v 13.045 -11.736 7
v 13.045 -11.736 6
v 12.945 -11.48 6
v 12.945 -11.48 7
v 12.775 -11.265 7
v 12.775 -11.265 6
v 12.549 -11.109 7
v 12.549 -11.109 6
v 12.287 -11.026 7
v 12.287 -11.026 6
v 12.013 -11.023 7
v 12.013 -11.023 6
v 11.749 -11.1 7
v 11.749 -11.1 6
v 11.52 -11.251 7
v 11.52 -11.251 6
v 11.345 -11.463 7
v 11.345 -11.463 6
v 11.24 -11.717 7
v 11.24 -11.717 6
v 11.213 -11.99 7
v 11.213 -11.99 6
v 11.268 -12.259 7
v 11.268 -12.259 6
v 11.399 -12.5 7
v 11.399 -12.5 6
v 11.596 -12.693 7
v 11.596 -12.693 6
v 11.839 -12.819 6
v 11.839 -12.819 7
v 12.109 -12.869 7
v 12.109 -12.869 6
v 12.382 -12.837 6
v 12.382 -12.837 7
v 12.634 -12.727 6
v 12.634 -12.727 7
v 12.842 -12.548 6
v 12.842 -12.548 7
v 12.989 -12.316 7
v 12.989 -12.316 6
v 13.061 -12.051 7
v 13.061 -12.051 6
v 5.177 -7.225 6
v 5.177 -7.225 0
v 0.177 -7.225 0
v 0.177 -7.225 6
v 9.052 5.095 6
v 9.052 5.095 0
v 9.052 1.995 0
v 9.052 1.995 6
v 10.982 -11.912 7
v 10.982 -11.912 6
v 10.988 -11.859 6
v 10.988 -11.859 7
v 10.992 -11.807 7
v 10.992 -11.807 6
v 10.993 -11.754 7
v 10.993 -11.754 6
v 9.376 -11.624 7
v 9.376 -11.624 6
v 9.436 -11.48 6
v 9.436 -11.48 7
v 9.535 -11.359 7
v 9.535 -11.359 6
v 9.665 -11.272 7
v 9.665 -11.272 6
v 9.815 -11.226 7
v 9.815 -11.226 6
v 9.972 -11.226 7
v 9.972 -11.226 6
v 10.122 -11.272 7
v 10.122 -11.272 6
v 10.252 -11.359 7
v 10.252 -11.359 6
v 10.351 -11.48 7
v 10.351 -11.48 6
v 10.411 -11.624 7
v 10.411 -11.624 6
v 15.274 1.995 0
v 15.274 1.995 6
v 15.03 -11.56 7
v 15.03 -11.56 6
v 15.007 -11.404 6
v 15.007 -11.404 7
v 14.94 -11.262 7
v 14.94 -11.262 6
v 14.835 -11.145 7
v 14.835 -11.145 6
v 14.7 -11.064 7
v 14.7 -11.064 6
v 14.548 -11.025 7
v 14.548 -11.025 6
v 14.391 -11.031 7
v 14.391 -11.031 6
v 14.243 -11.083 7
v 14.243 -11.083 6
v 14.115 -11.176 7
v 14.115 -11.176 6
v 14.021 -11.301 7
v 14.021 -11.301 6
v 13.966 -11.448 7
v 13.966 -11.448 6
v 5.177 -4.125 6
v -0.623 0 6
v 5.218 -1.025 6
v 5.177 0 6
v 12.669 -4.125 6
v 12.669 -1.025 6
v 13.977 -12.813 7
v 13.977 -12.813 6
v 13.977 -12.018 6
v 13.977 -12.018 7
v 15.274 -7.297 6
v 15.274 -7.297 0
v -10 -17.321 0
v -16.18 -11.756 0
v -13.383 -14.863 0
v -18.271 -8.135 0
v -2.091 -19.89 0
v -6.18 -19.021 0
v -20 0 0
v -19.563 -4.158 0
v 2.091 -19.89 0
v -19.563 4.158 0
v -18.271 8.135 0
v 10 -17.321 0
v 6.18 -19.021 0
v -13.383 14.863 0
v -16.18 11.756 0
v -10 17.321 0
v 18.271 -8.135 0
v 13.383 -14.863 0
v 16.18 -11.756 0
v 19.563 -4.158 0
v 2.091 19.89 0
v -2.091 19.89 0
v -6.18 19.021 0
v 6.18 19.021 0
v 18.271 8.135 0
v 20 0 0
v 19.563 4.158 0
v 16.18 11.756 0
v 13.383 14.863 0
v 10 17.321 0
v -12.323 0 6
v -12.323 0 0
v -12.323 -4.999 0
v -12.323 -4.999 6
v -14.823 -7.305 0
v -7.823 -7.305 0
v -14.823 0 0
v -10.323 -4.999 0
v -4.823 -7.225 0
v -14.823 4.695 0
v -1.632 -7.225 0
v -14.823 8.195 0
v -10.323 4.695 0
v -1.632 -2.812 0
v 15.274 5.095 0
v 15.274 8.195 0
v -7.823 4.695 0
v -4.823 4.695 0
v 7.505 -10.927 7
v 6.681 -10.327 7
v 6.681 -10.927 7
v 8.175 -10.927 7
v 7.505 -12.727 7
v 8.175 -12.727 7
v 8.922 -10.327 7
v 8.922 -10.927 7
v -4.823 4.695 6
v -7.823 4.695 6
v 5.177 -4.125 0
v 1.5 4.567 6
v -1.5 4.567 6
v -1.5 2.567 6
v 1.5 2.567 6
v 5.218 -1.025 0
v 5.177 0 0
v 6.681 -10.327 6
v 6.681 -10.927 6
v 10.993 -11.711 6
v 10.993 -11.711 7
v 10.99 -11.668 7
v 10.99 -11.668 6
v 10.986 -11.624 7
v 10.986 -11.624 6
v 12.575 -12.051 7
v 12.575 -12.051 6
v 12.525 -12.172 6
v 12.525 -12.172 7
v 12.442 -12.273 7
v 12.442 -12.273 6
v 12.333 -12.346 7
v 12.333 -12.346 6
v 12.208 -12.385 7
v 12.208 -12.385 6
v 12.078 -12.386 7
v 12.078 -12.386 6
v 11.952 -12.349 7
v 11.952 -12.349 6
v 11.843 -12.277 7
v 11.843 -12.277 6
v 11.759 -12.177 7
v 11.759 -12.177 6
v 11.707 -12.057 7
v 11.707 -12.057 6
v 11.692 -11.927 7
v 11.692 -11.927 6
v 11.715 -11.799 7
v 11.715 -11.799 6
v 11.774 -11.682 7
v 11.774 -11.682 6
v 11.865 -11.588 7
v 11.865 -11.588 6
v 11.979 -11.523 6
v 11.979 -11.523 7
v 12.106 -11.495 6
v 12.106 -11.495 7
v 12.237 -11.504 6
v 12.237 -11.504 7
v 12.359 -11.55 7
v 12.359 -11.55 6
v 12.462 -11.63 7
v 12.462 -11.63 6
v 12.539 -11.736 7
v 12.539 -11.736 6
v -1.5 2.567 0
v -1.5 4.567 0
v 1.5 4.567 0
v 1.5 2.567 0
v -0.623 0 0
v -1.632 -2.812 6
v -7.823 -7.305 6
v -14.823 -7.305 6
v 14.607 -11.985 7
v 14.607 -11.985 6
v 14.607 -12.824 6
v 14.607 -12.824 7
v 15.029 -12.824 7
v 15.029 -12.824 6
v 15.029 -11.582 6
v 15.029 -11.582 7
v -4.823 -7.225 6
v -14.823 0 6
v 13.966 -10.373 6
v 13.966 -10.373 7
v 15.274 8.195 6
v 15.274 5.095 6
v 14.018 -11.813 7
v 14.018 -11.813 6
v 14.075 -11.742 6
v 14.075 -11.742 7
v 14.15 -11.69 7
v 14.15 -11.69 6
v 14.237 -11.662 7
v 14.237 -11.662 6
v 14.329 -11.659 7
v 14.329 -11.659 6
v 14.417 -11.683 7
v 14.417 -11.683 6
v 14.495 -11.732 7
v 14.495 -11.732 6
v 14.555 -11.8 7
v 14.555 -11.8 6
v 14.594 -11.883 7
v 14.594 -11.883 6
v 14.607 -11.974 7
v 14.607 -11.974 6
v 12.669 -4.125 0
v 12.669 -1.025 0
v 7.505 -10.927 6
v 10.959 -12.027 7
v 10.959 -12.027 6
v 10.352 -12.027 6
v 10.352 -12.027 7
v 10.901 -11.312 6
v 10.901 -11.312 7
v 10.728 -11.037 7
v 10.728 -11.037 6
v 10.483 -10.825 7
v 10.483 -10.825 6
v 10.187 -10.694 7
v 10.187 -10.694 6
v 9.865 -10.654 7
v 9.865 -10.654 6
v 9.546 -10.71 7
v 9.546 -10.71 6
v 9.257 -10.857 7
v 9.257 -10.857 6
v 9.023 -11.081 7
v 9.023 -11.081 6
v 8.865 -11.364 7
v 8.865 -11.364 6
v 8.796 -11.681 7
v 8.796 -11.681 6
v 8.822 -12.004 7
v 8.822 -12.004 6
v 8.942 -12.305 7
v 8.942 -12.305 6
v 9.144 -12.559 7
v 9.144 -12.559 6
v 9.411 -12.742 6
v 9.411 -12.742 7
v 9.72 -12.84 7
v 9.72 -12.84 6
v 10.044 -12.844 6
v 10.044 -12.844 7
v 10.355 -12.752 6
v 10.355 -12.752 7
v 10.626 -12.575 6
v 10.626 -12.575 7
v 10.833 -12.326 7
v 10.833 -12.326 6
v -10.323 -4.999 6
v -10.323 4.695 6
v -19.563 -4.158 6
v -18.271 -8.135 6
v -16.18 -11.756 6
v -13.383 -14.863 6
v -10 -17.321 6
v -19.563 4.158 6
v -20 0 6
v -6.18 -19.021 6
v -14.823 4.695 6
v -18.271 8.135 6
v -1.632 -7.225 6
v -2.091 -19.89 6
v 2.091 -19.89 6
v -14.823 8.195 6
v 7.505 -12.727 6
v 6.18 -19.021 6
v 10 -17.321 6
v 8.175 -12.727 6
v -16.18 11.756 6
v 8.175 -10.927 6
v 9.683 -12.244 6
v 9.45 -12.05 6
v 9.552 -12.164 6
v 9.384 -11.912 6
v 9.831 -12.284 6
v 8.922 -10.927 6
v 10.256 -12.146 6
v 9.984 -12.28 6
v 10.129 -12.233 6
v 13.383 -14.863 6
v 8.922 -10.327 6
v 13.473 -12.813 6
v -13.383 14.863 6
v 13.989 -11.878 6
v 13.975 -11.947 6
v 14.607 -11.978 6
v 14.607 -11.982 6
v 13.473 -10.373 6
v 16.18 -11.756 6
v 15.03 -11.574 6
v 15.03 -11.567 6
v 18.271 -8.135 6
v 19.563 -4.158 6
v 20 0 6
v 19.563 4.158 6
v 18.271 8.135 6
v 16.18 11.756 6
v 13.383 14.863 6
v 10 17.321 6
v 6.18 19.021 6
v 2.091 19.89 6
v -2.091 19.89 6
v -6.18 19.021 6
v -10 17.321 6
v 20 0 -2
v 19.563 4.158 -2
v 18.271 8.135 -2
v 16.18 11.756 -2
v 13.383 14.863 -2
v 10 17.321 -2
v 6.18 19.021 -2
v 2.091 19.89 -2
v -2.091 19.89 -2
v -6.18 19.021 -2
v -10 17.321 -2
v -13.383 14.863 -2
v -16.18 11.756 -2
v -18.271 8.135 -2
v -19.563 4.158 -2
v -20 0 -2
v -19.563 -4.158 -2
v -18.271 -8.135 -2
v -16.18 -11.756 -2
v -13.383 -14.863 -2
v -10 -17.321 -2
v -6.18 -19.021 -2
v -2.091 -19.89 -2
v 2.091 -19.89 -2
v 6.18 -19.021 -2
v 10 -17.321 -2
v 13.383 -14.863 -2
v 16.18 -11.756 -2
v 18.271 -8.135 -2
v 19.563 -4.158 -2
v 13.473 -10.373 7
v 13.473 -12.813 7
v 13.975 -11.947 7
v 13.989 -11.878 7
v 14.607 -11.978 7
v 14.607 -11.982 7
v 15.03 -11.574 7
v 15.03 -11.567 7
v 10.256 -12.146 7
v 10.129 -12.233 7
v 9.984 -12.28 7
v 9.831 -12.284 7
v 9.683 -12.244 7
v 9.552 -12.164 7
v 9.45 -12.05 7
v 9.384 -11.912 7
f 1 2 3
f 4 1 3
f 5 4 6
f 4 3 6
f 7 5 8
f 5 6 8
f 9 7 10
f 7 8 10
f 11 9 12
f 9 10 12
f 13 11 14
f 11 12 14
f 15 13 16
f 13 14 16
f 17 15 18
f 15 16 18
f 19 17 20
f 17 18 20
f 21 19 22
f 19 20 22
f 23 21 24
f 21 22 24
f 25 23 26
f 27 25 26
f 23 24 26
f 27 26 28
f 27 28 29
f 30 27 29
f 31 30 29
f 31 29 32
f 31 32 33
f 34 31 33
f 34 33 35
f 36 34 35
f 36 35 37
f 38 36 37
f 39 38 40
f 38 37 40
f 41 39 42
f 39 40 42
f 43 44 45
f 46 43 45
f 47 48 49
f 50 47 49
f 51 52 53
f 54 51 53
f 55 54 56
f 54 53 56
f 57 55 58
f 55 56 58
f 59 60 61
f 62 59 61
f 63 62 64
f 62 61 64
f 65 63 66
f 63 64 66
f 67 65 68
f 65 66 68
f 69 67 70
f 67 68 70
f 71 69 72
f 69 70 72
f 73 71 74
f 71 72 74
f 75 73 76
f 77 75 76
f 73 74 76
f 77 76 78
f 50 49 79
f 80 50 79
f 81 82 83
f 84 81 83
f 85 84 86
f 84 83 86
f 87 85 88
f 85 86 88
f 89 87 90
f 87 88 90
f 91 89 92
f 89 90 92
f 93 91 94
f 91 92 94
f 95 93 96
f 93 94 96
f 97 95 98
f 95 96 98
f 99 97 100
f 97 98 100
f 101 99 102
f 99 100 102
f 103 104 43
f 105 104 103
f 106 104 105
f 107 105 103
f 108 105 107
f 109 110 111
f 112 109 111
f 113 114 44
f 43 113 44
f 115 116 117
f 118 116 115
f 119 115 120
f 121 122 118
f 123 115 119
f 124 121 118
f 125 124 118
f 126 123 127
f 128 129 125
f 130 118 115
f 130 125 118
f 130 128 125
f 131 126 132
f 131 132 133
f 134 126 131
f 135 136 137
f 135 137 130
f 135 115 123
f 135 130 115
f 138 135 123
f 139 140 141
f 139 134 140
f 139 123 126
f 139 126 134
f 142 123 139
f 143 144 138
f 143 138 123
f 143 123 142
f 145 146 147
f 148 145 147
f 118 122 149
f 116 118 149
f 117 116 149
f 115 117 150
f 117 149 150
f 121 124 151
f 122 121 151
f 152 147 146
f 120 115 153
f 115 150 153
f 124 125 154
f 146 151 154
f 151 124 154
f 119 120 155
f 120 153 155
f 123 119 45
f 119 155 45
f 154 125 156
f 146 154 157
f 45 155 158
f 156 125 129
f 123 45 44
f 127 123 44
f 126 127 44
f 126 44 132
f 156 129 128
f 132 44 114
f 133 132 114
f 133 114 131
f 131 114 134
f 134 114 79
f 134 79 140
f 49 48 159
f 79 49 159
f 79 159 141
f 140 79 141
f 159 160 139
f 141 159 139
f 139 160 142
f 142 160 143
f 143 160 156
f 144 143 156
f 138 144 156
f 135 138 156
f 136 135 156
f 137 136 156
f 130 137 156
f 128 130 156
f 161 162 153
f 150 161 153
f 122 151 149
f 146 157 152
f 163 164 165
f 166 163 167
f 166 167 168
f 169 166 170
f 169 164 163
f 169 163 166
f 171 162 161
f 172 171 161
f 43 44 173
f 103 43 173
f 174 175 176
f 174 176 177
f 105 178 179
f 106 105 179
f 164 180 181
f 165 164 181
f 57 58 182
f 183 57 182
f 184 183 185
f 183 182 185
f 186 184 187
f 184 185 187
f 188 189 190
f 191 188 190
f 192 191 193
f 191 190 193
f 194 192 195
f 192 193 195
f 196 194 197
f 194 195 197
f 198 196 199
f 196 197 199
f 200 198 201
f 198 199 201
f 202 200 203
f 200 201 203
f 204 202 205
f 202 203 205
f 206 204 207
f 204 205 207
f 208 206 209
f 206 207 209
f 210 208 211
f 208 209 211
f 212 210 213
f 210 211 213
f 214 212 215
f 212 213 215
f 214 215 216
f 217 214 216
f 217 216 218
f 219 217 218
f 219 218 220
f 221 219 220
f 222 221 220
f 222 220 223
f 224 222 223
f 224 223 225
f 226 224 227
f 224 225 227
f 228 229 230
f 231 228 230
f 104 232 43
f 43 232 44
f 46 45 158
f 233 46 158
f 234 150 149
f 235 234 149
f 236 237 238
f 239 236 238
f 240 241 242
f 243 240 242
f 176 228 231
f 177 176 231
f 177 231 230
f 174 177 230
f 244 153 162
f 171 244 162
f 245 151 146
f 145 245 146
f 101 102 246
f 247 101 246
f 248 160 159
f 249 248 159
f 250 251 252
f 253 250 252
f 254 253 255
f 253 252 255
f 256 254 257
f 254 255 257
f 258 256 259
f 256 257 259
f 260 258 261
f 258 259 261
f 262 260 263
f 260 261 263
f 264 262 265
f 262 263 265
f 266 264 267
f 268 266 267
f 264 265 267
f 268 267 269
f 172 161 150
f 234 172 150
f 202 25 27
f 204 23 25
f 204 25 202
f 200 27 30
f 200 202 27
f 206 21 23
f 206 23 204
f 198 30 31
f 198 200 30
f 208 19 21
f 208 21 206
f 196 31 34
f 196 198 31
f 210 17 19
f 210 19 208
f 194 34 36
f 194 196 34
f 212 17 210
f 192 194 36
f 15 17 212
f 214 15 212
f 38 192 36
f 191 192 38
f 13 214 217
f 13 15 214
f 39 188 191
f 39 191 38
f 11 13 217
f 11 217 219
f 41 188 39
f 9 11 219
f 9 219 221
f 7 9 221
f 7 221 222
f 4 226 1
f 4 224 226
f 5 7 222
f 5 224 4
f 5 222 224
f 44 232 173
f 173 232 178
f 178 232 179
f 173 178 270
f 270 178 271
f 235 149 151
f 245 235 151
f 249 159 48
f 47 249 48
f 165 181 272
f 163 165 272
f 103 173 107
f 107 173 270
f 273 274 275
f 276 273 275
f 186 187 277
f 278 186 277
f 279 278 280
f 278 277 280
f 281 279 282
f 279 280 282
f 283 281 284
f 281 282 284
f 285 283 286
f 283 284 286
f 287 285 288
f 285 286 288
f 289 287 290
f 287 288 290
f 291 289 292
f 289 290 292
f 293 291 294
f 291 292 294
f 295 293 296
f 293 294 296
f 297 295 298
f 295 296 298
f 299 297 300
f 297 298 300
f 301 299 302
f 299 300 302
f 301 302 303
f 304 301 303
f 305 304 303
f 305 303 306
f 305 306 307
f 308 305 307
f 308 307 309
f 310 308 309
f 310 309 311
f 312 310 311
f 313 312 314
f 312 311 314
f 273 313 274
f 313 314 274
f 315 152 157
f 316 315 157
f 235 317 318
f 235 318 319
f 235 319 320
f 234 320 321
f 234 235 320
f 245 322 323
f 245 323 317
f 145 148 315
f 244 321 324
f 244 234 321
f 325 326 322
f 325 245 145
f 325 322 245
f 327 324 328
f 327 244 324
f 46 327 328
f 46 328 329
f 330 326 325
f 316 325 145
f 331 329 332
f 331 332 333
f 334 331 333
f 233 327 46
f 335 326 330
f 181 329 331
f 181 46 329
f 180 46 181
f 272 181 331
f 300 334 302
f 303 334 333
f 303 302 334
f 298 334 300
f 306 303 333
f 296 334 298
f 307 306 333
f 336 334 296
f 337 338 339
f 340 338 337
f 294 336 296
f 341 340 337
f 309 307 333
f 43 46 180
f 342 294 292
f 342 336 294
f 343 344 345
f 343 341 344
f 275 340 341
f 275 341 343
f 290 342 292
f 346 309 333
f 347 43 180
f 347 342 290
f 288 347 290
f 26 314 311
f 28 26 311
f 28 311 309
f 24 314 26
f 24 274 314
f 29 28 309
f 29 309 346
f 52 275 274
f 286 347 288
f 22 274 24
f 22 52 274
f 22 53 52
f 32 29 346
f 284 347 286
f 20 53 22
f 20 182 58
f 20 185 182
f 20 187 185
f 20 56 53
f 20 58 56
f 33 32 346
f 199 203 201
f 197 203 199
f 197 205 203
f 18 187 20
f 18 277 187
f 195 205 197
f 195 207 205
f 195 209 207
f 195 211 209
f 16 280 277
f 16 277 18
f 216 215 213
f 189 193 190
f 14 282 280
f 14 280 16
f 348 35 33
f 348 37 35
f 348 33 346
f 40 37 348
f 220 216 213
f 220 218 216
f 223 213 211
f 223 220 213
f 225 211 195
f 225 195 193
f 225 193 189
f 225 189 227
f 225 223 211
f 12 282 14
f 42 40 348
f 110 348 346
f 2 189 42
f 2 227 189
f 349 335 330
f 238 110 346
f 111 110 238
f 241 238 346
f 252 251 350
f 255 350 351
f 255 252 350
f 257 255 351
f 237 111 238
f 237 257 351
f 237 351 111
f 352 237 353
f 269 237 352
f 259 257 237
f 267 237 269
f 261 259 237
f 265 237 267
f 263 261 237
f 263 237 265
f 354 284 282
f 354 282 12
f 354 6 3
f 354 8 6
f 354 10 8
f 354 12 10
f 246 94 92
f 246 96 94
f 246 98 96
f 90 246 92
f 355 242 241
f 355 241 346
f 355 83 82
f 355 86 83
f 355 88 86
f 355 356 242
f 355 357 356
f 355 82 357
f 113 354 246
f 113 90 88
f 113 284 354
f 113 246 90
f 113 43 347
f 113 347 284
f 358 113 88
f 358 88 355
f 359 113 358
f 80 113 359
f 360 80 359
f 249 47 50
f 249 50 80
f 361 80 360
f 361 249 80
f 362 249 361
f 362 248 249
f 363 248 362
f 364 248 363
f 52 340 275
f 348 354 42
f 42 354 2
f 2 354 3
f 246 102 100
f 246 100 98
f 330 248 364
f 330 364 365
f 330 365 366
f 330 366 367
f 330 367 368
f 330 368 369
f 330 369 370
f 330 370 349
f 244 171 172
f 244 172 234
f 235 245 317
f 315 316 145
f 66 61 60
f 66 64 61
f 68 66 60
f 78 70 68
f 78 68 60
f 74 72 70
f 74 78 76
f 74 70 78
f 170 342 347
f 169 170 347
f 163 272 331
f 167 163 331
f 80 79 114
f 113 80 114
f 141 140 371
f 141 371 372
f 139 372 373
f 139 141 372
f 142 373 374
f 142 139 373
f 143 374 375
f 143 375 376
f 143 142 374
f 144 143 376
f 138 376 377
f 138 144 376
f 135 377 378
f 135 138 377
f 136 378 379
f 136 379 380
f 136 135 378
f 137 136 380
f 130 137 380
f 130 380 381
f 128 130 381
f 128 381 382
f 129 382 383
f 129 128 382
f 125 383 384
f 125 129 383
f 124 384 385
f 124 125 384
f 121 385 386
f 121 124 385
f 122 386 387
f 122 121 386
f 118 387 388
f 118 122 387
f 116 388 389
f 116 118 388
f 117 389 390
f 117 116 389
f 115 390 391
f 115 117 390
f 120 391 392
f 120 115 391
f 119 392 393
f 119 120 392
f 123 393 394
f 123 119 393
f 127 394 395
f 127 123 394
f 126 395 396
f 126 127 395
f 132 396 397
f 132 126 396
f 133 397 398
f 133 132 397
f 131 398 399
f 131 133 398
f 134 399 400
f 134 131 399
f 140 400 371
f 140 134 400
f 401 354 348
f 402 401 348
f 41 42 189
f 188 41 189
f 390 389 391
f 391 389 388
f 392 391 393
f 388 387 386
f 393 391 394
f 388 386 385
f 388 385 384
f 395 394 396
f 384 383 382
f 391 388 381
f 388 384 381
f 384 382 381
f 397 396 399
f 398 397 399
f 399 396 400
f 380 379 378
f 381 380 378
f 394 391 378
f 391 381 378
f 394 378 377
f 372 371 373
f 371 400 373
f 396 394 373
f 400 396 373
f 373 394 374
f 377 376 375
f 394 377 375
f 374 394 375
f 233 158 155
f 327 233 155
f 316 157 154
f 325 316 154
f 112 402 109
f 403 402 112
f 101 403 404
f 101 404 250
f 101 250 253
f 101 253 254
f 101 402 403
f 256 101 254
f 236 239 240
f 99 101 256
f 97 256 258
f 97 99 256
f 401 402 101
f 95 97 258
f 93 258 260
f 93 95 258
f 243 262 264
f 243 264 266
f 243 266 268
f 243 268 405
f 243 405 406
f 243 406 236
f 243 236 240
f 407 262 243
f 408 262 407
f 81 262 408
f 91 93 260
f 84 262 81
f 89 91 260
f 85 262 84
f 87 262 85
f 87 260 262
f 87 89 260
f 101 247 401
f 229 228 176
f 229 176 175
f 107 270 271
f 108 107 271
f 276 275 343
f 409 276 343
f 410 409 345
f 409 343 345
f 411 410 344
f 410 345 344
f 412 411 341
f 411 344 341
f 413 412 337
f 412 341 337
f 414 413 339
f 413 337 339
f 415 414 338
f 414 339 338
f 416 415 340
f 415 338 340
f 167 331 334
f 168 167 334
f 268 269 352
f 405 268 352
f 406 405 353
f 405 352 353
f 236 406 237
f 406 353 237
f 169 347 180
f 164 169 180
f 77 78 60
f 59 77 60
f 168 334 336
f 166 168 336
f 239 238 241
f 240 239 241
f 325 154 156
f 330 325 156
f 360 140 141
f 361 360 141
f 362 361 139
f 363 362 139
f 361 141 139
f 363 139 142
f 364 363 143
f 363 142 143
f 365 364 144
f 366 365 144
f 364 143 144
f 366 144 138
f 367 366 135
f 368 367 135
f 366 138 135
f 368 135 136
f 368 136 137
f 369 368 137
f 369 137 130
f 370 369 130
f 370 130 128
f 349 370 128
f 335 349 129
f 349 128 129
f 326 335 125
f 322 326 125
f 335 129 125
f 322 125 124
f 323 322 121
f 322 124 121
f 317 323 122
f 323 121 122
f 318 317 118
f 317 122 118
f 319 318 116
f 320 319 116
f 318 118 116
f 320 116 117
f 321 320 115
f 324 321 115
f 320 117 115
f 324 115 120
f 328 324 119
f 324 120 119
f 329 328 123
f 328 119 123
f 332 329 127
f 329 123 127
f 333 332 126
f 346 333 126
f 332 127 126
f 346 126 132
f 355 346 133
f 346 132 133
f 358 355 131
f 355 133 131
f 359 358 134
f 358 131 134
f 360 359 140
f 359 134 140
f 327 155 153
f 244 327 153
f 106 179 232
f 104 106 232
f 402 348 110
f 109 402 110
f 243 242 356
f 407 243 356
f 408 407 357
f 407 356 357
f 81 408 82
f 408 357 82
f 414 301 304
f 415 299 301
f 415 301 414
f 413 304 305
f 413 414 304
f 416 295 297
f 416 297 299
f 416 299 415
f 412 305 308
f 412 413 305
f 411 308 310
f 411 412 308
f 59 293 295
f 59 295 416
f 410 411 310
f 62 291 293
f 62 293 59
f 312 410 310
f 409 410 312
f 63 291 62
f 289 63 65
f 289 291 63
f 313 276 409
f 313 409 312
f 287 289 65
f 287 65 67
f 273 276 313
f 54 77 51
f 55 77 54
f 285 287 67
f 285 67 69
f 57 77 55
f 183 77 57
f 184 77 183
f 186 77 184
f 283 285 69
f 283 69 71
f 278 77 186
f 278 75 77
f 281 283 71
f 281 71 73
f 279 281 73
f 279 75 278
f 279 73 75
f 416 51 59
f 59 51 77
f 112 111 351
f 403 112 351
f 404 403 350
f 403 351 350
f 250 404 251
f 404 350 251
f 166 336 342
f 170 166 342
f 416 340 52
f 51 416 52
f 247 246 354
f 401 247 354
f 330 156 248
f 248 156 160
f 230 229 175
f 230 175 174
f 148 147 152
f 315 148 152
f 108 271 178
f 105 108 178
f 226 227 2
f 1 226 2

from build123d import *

# Parameters (mm, degrees)
F0_R     = 20
F1_DEPTH = 6
F0_W     = 3
F0_H     = 2
F2_DEPTH = 6
F3_DEPTH = 6
F6_R     = 20
F7_DEPTH = 2
F9_DEPTH = 1


# Not quite as in the source:
# - the program builds the solid bodies; features that only make, move or delete a surface that nothing else refers to are left out


with BuildPart() as f1:
    # F0 (on Top) → F1 (new body)
    with BuildSketch(Plane.XY):
        Circle(F0_R)
        Polygon((-14.8229663414, 4.6952926321), (-14.8229663414, 8.1952926321), (-4.8229663414, 8.1952926321), (5.1770336586, 8.1952926321), (15.2737221277, 8.1952926321), (15.2737221277, 5.0952926321), (9.0523306343, 5.0952926321), (9.0523306343, 1.9952926321), (15.2737221277, 1.9952926321), (15.2737221277, -7.2968558197), (5.1770336586, -7.2245139418), (0.1770336586, -7.2245139418), (-1.6315090997, -2.8116659632), (-1.6315090997, -7.2245139418), (-4.8229663414, -7.2245139418), (-4.8229663414, 4.6952926321), (-7.8229663414, 4.6952926321), (-7.8229663414, -7.3047073679), (-14.8229663414, -7.3047073679), (-14.8229663414, 0), (-12.3229663414, 0), (-12.3229663414, -4.9991512411), (-10.3229663414, -4.9991512411), (-10.3229663414, 4.6952926321), align=None, mode=Mode.SUBTRACT)
    extrude(amount=F1_DEPTH)

    # F8 (on face) → F9 (join)
    with BuildSketch(Plane.XY.offset(6)):
        with BuildLine():
            Line((15.0292580947, -12.8243761654), (15.0292580947, -11.5819023922))
            ThreePointArc((15.0292580947, -11.5819023922), (14.9037661569, -11.9053522282), (14.6068680189, -12.0848501905))
            Line((14.6068680189, -12.0848501905), (14.6068680189, -12.8243761654))
            Line((14.6068680189, -12.8243761654), (15.0292580947, -12.8243761654))
        make_face()
        with BuildLine():
            ThreePointArc((15.0297242951, -11.5595152602), (14.5479652061, -11.0246856664), (13.965879567, -11.4481367533))
            ThreePointArc((13.965879567, -11.4481367533), (13.9595626035, -11.63513708), (14.0177011696, -11.8129823311))
            ThreePointArc((14.0177011696, -11.8129823311), (14.373767478, -11.6682234447), (14.6070883482, -11.9736734778))
            ThreePointArc((14.6070883482, -11.9736734778), (14.6070332611, -11.9795792393), (14.6068680189, -11.9854829456))
            Line((14.6068680189, -11.9854829456), (14.6068680189, -12.0848501905))
            ThreePointArc((14.6068680189, -12.0848501905), (14.9037661569, -11.9053522282), (15.0292580947, -11.5819023922))
            ThreePointArc((15.0292580947, -11.5819023922), (15.0296077324, -11.570711253), (15.0297242951, -11.5595152602))
        make_face()
        with BuildLine():
            Line((13.965879567, -10.3730093688), (13.4733673185, -10.3730093688))
            Line((13.4733673185, -10.3730093688), (13.4733673185, -12.8131825477))
            Line((13.4733673185, -12.8131825477), (13.977073133, -12.8131825477))
            Line((13.977073133, -12.8131825477), (13.977073133, -12.0184542606))
            ThreePointArc((13.977073133, -12.0184542606), (13.9799034833, -11.912261244), (14.0177011696, -11.8129823311))
            ThreePointArc((14.0177011696, -11.8129823311), (13.9595626035, -11.63513708), (13.965879567, -11.4481367533))
            Line((13.965879567, -11.4481367533), (13.965879567, -10.3730093688))
        make_face()
        with BuildLine():
            Line((12.5385226393, -11.7363042429), (13.0446804071, -11.7363042429))
            ThreePointArc((13.0446804071, -11.7363042429), (11.2134738953, -11.990157639), (13.0611900744, -12.0510161396))
            Line((13.0611900744, -12.0510161396), (12.5746978874, -12.0510161396))
            ThreePointArc((12.5746978874, -12.0510161396), (11.6945373163, -11.992753054), (12.5385226393, -11.7363042429))
        make_face()
        with BuildLine():
            Line((10.4112224445, -11.6244971905), (10.9858511253, -11.6244971905))
            ThreePointArc((10.9858511253, -11.6244971905), (8.7959122239, -11.6808773259), (10.9590917495, -12.0268042712))
            Line((10.9590917495, -12.0268042712), (10.352076243, -12.0268042712))
            ThreePointArc((10.352076243, -12.0268042712), (9.8306001316, -12.2838217189), (9.3837593923, -11.9118961121))
            ThreePointArc((9.3837593923, -11.9118961121), (9.3600362793, -11.7687460957), (9.3757514516, -11.6244971905))
            ThreePointArc((9.3757514516, -11.6244971905), (9.893486948, -11.2202245839), (10.4112224445, -11.6244971905))
        make_face()
        with BuildLine():
            ThreePointArc((10.9820785301, -11.9118961121), (10.9906311364, -11.8330948527), (10.993486948, -11.7538822913))
            ThreePointArc((10.993486948, -11.7538822913), (10.9915763331, -11.6890771794), (10.9858511253, -11.6244971905))
            Line((10.9858511253, -11.6244971905), (10.4112224445, -11.6244971905))
            ThreePointArc((10.4112224445, -11.6244971905), (10.4231491454, -11.6887017322), (10.4271446554, -11.7538822913))
            ThreePointArc((10.4271446554, -11.7538822913), (10.4211282028, -11.8337900814), (10.4032145037, -11.9118961121))
            Line((10.4032145037, -11.9118961121), (10.9820785301, -11.9118961121))
        make_face()
        with BuildLine():
            ThreePointArc((10.4271446554, -11.7538822913), (10.4231491454, -11.6887017322), (10.4112224445, -11.6244971905))
            Line((10.4112224445, -11.6244971905), (9.3757514516, -11.6244971905))
            ThreePointArc((9.3757514516, -11.6244971905), (9.3600362793, -11.7687460957), (9.3837593923, -11.9118961121))
            Line((9.3837593923, -11.9118961121), (10.4032145037, -11.9118961121))
            ThreePointArc((10.4032145037, -11.9118961121), (10.4211282028, -11.8337900814), (10.4271446554, -11.7538822913))
        make_face()
        Polygon((8.9217557242, -10.3269937025), (6.6808465031, -10.3269937025), (6.6808465031, -10.9269937025), (7.5050893758, -10.9269937025), (7.5050893758, -12.7269937025), (8.1747866203, -12.7269937025), (8.1747866203, -10.9269937025), (8.9217557242, -10.9269937025), align=None)
    extrude(amount=F9_DEPTH)


with BuildPart() as f2:
    # F0 (on Top) → F2 (new body)
    with BuildSketch(Plane.XY):
        with Locations((0, 3.5671954031)):
            Rectangle(F0_W, F0_H)
    extrude(amount=F2_DEPTH)


with BuildPart() as f3:
    # F0 (on Top) → F3 (new body)
    with BuildSketch(Plane.XY):
        Polygon((5.2182162243, -1.0245139418), (5.1770336586, 0), (-0.6229663414, 0), (5.1770336586, -7.2245139418), (5.1770336586, -4.1245139418), (12.6694194104, -4.1245139418), (12.6694194104, -1.0245139418), align=None)
    extrude(amount=F3_DEPTH)


with BuildPart() as f7:
    # F6 (on face) → F7 (new body)
    with BuildSketch(Plane.XY):
        Circle(F6_R)
    extrude(amount=-F7_DEPTH)


solid = Compound([f1.part, f2.part, f3.part, f7.part])
